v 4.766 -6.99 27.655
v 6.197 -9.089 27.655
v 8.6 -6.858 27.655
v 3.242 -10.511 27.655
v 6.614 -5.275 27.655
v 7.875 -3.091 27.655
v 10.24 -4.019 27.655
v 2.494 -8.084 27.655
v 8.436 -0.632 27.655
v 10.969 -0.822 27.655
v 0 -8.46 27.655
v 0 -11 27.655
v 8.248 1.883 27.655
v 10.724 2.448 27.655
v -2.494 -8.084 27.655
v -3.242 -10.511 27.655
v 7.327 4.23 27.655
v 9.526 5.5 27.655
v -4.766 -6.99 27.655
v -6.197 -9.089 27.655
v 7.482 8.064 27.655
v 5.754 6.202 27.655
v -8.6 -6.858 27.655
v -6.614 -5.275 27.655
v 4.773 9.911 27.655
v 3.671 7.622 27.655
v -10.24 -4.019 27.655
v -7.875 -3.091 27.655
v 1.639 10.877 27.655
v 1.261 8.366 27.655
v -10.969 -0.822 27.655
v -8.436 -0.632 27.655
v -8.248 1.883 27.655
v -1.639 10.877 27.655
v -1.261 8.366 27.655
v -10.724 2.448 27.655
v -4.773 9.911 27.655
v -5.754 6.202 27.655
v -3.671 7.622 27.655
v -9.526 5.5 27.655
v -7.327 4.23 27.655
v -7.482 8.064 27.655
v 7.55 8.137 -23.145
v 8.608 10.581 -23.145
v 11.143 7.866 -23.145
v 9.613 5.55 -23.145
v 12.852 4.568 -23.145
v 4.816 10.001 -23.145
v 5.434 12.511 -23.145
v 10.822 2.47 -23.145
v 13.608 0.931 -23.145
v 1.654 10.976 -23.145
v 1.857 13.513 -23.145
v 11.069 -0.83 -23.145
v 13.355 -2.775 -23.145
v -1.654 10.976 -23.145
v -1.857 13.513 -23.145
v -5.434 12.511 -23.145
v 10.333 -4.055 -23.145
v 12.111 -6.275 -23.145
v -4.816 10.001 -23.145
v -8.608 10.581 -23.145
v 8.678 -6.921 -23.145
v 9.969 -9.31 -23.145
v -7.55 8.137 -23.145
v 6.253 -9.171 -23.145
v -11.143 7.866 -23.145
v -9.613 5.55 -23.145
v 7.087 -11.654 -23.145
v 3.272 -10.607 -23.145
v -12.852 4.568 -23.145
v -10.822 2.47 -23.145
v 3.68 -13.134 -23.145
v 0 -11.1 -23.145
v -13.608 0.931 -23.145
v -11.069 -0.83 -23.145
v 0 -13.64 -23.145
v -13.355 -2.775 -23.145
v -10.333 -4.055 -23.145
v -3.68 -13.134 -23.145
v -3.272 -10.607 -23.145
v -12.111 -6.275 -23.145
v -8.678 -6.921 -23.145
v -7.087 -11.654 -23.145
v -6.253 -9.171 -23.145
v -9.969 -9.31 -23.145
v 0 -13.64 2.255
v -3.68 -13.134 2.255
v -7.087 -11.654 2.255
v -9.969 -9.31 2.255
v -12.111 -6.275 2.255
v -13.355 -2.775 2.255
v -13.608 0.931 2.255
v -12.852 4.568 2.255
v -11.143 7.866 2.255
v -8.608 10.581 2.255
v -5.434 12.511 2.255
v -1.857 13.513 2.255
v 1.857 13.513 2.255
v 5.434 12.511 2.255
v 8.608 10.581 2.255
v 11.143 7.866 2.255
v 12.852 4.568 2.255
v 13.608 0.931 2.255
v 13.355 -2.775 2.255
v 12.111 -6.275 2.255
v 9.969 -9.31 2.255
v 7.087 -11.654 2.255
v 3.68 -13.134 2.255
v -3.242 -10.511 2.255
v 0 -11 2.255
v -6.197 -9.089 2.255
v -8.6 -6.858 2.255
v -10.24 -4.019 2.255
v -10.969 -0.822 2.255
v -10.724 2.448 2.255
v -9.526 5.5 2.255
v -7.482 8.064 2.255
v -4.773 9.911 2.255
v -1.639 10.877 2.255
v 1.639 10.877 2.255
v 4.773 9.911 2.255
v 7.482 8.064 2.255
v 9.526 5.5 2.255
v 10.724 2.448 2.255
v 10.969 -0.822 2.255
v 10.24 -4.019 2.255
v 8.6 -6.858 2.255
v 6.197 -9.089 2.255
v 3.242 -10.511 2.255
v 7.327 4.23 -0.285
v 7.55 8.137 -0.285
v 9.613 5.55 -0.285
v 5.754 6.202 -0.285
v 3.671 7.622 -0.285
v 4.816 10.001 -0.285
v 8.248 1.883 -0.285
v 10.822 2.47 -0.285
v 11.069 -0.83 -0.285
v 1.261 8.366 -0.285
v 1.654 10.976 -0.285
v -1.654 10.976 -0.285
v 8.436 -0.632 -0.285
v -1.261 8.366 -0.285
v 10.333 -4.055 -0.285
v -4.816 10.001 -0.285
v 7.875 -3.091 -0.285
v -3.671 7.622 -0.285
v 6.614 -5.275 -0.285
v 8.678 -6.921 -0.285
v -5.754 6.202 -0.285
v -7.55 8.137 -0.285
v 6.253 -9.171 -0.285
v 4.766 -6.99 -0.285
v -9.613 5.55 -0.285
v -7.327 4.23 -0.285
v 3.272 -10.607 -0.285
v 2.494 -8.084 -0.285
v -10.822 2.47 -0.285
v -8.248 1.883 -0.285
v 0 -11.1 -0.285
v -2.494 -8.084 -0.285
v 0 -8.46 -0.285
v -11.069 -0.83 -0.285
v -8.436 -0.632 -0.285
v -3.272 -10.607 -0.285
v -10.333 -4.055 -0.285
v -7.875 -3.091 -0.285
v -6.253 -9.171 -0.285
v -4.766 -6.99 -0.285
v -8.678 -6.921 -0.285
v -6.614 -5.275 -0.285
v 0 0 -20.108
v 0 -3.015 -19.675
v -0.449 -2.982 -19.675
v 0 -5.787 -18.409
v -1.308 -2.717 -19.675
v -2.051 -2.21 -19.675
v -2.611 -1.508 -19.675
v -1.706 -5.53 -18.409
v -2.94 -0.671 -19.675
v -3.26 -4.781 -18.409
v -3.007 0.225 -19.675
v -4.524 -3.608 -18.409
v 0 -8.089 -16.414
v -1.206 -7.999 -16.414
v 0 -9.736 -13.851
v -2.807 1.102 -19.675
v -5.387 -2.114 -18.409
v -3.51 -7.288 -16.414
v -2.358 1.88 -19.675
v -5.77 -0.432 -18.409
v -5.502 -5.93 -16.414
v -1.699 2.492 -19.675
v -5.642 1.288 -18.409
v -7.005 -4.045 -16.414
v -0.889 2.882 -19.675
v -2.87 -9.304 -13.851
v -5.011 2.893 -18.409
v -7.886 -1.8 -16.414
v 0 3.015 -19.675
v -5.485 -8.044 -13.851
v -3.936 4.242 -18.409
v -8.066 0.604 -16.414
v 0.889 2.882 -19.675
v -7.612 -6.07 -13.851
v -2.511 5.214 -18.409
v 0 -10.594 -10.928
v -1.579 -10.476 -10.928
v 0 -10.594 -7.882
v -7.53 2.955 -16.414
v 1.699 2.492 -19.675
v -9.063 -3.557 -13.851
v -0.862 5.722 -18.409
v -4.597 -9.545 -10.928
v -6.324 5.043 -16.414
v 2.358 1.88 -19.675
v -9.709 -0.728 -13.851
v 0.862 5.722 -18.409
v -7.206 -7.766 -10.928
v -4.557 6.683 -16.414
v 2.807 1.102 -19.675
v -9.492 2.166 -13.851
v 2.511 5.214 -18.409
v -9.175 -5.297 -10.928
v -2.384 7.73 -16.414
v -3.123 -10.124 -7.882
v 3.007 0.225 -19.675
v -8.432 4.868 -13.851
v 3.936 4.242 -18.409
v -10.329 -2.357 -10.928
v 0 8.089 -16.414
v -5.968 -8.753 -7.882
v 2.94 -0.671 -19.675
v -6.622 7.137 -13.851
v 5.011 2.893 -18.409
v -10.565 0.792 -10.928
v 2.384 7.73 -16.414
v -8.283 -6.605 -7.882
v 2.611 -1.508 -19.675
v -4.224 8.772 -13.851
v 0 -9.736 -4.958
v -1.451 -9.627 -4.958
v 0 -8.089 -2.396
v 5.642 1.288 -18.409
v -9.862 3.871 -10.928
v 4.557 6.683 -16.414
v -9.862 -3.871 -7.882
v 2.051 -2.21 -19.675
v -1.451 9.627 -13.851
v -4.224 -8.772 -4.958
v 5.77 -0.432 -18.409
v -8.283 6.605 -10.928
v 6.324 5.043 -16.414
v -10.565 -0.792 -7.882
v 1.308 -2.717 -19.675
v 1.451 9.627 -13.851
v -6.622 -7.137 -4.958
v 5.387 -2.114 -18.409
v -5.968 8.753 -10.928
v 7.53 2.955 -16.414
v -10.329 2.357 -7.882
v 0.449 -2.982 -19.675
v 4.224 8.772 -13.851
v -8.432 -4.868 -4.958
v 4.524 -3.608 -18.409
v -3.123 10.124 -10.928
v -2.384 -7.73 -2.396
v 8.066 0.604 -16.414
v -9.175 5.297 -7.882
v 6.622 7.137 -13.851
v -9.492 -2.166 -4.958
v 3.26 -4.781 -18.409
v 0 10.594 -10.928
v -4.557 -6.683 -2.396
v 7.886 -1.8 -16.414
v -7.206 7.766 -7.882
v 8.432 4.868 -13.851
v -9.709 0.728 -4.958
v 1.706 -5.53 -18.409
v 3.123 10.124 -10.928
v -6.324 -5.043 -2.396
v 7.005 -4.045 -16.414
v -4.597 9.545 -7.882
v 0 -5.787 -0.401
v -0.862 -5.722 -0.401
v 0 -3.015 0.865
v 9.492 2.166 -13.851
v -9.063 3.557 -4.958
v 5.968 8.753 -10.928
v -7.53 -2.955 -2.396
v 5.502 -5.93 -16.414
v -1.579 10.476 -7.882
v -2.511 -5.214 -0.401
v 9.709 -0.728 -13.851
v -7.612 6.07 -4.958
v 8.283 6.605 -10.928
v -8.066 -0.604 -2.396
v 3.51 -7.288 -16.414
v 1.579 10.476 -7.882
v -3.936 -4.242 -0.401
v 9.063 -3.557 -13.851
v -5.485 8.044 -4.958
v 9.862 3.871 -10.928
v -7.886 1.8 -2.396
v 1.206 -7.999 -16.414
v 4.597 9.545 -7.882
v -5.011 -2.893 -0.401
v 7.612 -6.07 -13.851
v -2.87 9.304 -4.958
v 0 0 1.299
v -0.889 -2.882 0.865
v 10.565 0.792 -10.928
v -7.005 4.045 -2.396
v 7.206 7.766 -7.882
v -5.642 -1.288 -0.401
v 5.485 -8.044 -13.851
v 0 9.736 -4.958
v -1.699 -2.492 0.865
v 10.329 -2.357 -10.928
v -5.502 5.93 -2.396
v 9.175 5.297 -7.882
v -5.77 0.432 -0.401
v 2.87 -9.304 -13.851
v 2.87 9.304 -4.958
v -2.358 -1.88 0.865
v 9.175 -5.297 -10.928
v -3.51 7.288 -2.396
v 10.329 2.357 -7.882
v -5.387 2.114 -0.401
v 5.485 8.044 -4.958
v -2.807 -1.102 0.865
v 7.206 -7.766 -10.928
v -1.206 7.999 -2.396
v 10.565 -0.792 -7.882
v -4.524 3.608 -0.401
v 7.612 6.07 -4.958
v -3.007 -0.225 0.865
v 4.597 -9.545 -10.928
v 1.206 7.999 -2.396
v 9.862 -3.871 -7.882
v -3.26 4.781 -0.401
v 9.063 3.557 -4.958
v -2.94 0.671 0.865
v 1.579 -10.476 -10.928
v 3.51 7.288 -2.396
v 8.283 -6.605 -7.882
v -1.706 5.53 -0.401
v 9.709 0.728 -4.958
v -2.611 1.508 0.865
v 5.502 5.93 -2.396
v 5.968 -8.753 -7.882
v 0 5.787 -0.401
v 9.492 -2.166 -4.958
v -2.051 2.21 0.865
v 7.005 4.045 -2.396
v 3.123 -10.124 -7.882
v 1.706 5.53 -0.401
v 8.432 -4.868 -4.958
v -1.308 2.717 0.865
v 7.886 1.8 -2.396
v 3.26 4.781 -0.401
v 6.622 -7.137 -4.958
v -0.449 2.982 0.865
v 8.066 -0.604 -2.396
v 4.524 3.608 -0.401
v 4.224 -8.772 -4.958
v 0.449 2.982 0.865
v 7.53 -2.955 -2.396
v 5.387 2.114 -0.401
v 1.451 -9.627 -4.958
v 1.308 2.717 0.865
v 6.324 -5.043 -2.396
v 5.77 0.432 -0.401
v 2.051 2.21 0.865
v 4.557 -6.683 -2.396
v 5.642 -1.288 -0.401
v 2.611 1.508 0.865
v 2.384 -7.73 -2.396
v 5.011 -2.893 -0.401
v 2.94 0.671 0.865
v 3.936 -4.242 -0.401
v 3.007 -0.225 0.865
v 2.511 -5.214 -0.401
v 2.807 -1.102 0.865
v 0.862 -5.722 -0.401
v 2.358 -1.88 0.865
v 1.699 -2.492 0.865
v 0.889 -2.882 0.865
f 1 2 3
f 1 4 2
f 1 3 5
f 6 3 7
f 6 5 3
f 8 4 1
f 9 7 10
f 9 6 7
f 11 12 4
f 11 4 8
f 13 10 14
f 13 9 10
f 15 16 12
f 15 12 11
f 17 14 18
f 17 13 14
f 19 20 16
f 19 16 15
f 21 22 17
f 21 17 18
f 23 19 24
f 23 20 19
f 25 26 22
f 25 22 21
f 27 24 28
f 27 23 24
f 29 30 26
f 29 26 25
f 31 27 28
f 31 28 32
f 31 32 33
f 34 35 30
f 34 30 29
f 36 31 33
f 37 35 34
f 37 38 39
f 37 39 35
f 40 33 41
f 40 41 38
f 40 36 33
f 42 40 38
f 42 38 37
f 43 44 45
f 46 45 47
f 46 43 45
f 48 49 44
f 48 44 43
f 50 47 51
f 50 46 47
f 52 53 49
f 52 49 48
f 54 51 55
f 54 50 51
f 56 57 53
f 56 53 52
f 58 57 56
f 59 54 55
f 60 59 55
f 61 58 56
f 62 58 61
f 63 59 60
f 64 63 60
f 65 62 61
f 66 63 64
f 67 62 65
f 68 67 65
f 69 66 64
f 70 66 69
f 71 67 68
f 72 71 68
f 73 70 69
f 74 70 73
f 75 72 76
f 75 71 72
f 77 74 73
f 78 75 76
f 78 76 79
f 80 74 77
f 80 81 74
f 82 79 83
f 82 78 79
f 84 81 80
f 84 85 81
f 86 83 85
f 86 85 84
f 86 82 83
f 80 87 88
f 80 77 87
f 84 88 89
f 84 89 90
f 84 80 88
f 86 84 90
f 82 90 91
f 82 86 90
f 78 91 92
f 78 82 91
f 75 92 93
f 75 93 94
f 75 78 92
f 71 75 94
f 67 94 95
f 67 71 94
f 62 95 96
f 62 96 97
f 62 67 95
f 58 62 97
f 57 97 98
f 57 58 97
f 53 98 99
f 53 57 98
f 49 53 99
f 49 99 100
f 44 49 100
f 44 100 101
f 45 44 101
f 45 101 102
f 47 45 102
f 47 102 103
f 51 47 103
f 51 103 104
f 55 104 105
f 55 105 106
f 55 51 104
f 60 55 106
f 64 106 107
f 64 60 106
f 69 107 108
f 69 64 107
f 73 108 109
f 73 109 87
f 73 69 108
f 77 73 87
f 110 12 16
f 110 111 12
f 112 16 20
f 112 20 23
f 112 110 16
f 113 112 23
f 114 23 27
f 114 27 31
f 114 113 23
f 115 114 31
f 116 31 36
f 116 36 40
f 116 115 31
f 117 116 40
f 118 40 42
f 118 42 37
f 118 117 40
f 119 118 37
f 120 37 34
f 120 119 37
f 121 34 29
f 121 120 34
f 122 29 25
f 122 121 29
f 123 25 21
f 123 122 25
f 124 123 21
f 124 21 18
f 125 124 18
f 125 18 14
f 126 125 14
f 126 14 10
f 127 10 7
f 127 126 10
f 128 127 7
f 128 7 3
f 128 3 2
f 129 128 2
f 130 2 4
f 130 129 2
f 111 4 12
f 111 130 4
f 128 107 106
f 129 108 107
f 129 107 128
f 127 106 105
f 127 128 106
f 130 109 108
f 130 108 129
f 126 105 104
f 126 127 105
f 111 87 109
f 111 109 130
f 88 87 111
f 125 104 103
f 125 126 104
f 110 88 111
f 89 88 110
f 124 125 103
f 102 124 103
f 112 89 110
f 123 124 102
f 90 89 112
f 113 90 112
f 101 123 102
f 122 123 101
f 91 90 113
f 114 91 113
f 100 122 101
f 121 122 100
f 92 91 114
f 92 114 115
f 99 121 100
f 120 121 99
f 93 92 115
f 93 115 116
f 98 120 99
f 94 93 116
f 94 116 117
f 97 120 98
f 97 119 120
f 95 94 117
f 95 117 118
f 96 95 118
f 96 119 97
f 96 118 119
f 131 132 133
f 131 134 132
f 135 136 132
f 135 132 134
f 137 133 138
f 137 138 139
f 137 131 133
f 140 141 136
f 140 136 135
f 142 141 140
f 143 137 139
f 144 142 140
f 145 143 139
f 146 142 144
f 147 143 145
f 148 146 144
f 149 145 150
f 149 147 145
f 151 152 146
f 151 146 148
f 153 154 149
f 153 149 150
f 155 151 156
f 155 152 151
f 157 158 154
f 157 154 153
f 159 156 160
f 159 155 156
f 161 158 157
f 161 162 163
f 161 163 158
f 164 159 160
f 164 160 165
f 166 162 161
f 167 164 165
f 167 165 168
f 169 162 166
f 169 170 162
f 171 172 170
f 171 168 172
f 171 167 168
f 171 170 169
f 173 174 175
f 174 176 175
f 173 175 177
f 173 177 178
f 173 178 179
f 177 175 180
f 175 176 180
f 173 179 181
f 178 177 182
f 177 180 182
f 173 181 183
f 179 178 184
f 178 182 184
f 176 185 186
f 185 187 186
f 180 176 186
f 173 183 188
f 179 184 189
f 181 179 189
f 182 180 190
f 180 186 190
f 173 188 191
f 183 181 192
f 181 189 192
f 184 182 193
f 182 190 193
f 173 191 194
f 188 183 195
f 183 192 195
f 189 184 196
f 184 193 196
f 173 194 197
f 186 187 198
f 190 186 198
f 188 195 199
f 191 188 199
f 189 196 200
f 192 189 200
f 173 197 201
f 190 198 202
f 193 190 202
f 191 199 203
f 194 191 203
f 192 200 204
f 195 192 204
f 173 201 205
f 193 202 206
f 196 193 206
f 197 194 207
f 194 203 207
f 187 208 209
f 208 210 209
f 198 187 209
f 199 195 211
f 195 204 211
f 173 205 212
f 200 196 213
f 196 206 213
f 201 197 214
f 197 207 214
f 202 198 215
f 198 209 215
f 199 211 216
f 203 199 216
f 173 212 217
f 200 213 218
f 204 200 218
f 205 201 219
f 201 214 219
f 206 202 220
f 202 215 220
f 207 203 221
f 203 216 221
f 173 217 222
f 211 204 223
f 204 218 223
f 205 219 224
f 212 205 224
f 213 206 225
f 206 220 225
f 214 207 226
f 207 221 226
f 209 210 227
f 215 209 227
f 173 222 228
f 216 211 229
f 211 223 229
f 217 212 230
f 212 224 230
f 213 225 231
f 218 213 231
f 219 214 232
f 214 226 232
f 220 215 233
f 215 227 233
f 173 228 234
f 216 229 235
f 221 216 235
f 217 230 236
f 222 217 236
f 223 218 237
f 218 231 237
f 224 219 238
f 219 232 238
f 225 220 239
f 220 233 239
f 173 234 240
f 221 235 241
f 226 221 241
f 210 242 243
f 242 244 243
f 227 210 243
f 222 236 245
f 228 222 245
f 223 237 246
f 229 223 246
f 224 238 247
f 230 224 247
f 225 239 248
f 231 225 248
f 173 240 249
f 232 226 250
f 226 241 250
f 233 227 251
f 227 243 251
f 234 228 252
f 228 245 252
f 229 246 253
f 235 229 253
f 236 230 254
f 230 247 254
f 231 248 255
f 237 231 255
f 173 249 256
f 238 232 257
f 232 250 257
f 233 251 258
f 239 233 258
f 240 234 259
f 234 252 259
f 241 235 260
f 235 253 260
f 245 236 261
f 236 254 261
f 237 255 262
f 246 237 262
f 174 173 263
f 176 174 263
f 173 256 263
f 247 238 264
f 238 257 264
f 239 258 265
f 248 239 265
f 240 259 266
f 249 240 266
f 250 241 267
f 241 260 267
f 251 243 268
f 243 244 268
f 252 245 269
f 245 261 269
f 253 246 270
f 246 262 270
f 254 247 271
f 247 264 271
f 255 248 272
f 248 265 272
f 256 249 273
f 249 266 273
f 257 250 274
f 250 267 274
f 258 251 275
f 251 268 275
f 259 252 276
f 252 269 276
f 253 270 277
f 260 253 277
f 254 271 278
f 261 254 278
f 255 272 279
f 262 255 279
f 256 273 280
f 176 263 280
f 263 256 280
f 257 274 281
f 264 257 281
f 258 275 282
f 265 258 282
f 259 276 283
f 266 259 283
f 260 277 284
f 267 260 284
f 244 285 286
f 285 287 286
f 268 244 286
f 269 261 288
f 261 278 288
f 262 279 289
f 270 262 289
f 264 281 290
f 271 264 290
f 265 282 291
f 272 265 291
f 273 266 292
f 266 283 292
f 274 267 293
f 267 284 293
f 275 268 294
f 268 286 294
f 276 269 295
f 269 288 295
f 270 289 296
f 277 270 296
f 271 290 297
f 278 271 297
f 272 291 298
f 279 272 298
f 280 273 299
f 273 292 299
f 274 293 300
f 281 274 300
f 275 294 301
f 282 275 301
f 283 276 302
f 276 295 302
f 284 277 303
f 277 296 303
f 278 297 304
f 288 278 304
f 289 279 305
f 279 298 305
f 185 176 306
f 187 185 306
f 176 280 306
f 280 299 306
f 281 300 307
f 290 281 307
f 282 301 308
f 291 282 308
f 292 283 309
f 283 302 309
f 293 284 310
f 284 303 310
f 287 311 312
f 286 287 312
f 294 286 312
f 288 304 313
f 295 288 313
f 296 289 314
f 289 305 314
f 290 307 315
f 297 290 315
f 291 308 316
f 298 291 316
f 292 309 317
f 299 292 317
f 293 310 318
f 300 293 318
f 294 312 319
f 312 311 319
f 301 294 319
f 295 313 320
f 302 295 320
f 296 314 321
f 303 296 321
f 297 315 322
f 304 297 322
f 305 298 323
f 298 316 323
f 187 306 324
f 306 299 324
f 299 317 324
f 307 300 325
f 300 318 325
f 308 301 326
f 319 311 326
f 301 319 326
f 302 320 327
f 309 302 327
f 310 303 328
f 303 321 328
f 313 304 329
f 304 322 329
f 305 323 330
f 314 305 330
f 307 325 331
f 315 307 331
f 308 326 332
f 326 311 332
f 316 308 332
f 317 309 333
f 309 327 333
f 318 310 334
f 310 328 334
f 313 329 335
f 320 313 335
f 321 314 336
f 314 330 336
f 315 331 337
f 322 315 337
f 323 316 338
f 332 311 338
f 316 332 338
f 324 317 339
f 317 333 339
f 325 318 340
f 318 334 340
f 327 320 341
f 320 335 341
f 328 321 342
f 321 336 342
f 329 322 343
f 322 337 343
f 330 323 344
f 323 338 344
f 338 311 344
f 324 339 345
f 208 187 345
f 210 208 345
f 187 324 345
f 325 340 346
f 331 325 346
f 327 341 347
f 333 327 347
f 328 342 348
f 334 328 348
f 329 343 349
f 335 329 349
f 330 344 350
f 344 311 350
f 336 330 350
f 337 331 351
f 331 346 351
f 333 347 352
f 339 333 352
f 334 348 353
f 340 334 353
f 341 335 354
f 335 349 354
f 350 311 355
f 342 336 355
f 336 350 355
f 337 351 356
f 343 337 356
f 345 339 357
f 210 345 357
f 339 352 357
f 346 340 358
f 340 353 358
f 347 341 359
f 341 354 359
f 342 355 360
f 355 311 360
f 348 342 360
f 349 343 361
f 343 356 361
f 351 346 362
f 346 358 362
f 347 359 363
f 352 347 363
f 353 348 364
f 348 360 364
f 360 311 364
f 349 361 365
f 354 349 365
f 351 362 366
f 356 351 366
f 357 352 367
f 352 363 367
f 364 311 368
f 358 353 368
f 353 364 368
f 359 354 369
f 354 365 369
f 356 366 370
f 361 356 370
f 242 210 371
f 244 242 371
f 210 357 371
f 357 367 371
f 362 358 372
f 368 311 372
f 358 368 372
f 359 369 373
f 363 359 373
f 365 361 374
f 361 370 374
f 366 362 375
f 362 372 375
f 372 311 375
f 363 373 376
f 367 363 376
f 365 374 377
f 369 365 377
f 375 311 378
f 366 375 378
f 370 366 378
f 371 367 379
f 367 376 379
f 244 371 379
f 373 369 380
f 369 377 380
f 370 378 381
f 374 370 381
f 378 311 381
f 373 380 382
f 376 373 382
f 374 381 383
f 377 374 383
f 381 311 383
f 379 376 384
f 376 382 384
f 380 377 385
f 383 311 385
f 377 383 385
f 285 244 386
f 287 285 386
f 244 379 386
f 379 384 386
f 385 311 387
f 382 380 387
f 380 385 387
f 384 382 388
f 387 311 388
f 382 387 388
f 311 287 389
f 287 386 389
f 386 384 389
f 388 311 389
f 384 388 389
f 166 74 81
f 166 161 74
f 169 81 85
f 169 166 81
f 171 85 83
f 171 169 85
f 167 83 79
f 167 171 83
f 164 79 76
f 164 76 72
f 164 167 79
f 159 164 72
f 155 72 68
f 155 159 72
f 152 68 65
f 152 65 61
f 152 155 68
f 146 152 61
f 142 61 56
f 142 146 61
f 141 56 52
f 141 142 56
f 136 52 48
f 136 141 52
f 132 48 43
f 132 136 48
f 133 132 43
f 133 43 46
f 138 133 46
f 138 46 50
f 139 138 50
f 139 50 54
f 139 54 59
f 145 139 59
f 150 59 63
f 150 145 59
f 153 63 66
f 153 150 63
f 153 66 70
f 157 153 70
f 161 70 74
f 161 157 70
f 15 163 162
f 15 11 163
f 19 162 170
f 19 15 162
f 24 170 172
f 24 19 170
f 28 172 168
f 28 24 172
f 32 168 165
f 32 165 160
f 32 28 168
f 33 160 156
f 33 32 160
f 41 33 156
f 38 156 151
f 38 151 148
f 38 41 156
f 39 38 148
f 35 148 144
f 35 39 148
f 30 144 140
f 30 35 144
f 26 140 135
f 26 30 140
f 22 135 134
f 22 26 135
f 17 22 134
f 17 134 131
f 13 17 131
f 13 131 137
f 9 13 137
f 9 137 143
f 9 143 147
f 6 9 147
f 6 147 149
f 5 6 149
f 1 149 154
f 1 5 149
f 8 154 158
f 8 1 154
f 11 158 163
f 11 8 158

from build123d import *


with BuildPart() as part:
    # Sketch1 → Revolve1 (revolve)
    with BuildSketch(Plane(origin=(0, 0, 0), x_dir=(0, 0, -1), z_dir=(1, 0, 0))):
        Polygon((-27.655022434, 11), (-2.255022434, 11), (-2.255022434, 13.64), (23.144977566, 13.64), (23.144977566, 11.1), (0.284977566, 11.1), (0.284977566, 8.46), (-27.655022434, 8.46), align=None)
        with BuildLine():
            Line((-1.298567003, 0), (20.108081425, 0))
            ThreePointArc((20.108081425, 0), (9.404757211, 10.703324214), (-1.298567003, 0))
        make_face()
    revolve(axis=Axis((0, 0, 27.655022434), (0, 0, -1)))


solid = part.part
